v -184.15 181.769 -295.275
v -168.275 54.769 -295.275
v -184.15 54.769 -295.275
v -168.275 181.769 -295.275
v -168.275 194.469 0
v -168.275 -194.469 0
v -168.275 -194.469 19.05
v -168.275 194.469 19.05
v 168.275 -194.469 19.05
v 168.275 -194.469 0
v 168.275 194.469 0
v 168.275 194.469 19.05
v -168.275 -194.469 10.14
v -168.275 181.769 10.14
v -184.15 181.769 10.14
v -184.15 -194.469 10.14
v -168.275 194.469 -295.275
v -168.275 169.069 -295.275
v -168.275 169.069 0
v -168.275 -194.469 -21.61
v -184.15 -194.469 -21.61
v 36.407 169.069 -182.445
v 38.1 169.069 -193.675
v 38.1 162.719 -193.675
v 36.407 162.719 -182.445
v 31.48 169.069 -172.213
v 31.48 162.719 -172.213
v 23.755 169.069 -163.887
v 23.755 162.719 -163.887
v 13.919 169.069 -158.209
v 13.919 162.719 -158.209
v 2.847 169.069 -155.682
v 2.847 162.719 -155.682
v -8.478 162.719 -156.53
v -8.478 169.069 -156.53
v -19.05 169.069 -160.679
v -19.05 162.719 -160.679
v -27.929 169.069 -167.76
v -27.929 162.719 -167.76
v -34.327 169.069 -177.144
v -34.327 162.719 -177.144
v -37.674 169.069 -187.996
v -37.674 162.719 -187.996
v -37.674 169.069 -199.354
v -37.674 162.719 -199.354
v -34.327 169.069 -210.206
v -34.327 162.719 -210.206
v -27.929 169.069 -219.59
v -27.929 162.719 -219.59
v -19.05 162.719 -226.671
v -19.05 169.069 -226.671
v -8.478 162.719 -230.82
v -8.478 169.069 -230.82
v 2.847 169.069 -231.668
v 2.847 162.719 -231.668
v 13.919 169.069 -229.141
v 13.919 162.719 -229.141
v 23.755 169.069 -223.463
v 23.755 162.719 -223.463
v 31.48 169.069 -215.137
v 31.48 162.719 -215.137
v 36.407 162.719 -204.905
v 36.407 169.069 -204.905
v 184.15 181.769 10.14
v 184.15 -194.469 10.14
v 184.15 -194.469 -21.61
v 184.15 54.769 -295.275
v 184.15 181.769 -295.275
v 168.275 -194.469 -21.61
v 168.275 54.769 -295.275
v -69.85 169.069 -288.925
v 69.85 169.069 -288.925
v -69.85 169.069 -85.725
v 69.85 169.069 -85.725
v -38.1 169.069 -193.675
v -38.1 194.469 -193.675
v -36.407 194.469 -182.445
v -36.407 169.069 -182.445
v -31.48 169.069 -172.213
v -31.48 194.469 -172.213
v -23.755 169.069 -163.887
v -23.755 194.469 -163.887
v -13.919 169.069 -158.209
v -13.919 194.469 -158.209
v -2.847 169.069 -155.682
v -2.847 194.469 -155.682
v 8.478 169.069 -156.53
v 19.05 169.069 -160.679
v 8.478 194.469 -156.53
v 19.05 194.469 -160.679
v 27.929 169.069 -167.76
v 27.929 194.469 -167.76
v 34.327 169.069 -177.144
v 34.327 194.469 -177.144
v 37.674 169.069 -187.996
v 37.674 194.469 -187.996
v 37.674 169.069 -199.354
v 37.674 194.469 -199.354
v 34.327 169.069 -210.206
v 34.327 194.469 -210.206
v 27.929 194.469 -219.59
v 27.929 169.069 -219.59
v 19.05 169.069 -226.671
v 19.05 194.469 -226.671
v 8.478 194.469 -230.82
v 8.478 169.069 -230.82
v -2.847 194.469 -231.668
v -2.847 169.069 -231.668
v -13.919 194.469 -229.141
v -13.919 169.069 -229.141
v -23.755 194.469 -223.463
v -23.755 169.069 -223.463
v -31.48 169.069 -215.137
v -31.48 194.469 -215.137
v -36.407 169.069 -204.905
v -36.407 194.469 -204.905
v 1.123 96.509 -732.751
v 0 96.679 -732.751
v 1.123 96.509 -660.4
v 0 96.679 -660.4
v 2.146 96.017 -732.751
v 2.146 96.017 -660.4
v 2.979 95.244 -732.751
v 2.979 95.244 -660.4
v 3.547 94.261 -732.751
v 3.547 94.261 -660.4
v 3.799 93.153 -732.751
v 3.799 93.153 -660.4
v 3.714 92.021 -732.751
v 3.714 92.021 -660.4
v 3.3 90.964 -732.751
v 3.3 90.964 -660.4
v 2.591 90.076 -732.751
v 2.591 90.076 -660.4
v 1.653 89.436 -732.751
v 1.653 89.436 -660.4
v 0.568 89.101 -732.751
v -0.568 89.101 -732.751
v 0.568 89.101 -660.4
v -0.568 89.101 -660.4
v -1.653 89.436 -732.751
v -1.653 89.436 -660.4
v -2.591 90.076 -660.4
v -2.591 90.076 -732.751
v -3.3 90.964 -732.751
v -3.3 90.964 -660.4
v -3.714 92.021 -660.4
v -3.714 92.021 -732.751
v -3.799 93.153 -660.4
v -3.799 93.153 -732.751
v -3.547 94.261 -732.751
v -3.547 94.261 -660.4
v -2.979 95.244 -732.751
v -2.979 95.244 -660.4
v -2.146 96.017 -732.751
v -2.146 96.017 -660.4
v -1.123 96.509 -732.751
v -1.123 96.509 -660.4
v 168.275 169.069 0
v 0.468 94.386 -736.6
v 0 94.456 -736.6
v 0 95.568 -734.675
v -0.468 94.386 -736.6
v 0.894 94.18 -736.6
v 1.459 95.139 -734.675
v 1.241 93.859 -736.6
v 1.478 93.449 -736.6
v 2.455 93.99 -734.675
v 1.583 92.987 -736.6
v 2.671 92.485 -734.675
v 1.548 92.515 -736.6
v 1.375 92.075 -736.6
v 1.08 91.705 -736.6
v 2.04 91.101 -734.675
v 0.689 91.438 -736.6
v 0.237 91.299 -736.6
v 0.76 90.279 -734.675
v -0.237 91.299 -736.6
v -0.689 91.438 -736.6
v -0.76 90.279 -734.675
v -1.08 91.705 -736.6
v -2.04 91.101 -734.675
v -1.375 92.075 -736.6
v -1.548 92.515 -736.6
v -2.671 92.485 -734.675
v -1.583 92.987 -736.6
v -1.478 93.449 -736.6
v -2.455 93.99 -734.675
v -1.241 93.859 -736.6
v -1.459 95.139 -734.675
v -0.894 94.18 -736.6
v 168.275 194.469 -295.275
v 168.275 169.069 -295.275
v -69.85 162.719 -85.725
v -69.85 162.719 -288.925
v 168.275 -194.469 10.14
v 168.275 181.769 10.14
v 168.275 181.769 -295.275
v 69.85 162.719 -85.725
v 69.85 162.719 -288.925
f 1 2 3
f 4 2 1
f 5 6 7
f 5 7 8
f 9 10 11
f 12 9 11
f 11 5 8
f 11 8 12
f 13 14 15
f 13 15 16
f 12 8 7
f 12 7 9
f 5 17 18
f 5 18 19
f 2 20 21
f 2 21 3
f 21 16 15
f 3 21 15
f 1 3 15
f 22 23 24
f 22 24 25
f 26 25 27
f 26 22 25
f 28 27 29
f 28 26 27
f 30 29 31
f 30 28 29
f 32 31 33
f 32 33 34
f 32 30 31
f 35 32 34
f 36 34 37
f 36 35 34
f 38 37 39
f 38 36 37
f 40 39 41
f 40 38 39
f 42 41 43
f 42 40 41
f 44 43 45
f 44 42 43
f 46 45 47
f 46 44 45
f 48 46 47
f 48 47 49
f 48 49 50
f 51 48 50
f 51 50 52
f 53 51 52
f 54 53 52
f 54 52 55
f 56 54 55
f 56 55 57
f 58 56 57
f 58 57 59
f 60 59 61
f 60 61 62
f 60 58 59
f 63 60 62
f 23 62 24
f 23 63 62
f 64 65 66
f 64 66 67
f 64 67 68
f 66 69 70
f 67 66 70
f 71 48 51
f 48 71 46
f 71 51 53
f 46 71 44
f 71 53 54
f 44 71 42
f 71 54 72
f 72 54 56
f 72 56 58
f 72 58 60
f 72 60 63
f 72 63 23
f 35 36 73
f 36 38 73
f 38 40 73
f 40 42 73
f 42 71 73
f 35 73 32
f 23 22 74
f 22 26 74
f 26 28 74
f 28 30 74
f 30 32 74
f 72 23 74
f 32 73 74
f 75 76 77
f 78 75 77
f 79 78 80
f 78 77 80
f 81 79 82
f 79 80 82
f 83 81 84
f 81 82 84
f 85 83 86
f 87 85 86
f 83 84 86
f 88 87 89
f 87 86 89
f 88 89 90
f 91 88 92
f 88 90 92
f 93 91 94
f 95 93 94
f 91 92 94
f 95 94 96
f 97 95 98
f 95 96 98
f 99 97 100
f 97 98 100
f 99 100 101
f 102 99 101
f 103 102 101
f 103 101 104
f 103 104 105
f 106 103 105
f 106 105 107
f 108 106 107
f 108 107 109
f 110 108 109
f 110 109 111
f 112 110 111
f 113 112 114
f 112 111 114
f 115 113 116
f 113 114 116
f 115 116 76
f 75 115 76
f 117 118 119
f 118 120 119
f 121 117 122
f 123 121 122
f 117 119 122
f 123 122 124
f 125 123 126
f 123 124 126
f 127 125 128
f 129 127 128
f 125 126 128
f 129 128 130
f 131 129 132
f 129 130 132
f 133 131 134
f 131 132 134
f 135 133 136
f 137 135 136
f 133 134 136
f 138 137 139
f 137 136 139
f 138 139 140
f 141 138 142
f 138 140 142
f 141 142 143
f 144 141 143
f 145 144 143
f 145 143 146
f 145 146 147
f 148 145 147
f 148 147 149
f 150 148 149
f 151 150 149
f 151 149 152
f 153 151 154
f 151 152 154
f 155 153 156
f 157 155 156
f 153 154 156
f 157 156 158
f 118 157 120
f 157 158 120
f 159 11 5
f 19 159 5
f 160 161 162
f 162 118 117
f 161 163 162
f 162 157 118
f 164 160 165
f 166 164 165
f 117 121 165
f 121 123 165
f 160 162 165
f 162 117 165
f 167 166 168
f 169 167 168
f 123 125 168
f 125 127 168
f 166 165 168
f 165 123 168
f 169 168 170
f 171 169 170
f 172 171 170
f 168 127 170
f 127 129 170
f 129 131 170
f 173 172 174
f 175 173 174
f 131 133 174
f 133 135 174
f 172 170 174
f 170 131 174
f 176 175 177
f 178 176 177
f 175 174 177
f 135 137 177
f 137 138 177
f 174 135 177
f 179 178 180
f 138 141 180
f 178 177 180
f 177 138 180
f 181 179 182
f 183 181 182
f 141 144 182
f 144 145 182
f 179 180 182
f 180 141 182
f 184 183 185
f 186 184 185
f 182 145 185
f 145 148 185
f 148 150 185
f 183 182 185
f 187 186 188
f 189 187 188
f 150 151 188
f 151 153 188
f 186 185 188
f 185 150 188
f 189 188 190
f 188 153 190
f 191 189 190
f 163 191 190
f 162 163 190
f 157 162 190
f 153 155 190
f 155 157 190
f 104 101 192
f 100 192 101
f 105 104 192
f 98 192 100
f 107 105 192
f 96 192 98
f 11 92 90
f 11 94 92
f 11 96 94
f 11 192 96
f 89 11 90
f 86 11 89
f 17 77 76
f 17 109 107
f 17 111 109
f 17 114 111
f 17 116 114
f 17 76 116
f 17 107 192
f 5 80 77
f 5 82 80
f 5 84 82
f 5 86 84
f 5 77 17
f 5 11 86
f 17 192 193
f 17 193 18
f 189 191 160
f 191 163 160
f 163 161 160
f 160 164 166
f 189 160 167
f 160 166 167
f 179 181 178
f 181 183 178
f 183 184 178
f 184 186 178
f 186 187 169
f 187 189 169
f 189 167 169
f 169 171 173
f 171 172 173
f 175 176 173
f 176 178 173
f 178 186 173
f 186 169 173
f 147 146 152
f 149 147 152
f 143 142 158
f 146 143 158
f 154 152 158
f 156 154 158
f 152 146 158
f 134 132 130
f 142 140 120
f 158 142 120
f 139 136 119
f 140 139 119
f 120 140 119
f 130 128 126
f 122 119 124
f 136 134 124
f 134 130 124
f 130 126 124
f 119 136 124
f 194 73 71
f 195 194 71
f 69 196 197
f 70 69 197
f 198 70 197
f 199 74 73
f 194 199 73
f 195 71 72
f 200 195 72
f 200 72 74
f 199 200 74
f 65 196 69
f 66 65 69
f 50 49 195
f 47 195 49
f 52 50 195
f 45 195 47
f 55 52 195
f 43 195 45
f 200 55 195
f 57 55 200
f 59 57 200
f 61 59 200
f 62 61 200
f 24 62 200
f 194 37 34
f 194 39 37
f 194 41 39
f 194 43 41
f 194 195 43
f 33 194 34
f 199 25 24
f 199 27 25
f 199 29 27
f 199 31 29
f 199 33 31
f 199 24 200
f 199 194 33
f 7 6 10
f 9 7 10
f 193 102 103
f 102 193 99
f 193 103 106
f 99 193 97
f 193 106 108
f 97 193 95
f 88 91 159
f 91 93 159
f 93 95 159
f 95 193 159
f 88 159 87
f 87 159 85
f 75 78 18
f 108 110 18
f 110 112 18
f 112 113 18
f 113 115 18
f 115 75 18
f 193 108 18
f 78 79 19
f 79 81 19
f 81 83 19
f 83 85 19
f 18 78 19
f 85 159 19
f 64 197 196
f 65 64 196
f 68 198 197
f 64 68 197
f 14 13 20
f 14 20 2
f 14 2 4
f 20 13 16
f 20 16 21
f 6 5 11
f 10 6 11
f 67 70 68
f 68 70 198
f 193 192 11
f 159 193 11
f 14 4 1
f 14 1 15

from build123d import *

# Parameters (mm, degrees)
F0_W     = 336.55
F0_H     = 388.9375
F1_DEPTH = 19.05
F2_W     = 336.55
F2_H     = 295.275
F2_R     = 38.1
F3_DEPTH = 25.4
F5_DEPTH = 15.875
F7_R     = 38.1
F8_DEPTH = 6.35


with BuildPart() as f1:
    # F0 (on Top) → F1 (new body)
    with BuildSketch(Plane.XY):
        Rectangle(F0_W, F0_H)
    extrude(amount=F1_DEPTH)


with BuildPart() as f3:
    # F2 (on face) → F3 (new body)
    with BuildSketch(Plane(origin=(0, 194.46875, 0), x_dir=(-1, 0, 0), z_dir=(0, 1, 0))):
        with Locations((0, -147.6375)):
            Rectangle(F2_W, F2_H)
        with Locations((0, -193.675)):
            Circle(F2_R, mode=Mode.SUBTRACT)
    extrude(amount=-F3_DEPTH)


with BuildPart() as f5:
    # F4 (on face) → F5 (new body)
    with BuildSketch(Plane.YZ.offset(168.275)):
        Polygon((181.76875, 10.139913), (-194.46875, 10.139913), (-194.46875, -21.610087), (54.76875, -295.275), (181.76875, -295.275), align=None)
    extrude(amount=F5_DEPTH)


with BuildPart() as f6_1:
    # F6: instance of F5
    add(f5.part.mirror(Plane.YZ))


with BuildPart() as f8:
    # F7 (on face) → F8 (new body)
    with BuildSketch(Plane.XZ.offset(-169.06875)):
        Polygon((-69.85, -85.725), (-69.85, -288.925), (0, -288.925), (69.85, -288.925), (69.85, -85.725), (0, -85.725), align=None)
        with Locations((0, -193.675)):
            Circle(F7_R, mode=Mode.SUBTRACT)
    extrude(amount=F8_DEPTH)


with BuildPart() as f10:
    # F9 (on Right) → F10 (revolve)
    with BuildSketch(Plane.YZ):
        Polygon((96.67875, -660.4), (92.86875, -660.4), (92.86875, -736.6), (94.45625, -736.6), (96.67875, -732.750517), align=None)
    revolve(axis=Axis((0, 92.86875, -698.5), (0, 0, -1)))


solid = Compound([f1.part, f3.part, f5.part, f6_1.part, f8.part, f10.part])
